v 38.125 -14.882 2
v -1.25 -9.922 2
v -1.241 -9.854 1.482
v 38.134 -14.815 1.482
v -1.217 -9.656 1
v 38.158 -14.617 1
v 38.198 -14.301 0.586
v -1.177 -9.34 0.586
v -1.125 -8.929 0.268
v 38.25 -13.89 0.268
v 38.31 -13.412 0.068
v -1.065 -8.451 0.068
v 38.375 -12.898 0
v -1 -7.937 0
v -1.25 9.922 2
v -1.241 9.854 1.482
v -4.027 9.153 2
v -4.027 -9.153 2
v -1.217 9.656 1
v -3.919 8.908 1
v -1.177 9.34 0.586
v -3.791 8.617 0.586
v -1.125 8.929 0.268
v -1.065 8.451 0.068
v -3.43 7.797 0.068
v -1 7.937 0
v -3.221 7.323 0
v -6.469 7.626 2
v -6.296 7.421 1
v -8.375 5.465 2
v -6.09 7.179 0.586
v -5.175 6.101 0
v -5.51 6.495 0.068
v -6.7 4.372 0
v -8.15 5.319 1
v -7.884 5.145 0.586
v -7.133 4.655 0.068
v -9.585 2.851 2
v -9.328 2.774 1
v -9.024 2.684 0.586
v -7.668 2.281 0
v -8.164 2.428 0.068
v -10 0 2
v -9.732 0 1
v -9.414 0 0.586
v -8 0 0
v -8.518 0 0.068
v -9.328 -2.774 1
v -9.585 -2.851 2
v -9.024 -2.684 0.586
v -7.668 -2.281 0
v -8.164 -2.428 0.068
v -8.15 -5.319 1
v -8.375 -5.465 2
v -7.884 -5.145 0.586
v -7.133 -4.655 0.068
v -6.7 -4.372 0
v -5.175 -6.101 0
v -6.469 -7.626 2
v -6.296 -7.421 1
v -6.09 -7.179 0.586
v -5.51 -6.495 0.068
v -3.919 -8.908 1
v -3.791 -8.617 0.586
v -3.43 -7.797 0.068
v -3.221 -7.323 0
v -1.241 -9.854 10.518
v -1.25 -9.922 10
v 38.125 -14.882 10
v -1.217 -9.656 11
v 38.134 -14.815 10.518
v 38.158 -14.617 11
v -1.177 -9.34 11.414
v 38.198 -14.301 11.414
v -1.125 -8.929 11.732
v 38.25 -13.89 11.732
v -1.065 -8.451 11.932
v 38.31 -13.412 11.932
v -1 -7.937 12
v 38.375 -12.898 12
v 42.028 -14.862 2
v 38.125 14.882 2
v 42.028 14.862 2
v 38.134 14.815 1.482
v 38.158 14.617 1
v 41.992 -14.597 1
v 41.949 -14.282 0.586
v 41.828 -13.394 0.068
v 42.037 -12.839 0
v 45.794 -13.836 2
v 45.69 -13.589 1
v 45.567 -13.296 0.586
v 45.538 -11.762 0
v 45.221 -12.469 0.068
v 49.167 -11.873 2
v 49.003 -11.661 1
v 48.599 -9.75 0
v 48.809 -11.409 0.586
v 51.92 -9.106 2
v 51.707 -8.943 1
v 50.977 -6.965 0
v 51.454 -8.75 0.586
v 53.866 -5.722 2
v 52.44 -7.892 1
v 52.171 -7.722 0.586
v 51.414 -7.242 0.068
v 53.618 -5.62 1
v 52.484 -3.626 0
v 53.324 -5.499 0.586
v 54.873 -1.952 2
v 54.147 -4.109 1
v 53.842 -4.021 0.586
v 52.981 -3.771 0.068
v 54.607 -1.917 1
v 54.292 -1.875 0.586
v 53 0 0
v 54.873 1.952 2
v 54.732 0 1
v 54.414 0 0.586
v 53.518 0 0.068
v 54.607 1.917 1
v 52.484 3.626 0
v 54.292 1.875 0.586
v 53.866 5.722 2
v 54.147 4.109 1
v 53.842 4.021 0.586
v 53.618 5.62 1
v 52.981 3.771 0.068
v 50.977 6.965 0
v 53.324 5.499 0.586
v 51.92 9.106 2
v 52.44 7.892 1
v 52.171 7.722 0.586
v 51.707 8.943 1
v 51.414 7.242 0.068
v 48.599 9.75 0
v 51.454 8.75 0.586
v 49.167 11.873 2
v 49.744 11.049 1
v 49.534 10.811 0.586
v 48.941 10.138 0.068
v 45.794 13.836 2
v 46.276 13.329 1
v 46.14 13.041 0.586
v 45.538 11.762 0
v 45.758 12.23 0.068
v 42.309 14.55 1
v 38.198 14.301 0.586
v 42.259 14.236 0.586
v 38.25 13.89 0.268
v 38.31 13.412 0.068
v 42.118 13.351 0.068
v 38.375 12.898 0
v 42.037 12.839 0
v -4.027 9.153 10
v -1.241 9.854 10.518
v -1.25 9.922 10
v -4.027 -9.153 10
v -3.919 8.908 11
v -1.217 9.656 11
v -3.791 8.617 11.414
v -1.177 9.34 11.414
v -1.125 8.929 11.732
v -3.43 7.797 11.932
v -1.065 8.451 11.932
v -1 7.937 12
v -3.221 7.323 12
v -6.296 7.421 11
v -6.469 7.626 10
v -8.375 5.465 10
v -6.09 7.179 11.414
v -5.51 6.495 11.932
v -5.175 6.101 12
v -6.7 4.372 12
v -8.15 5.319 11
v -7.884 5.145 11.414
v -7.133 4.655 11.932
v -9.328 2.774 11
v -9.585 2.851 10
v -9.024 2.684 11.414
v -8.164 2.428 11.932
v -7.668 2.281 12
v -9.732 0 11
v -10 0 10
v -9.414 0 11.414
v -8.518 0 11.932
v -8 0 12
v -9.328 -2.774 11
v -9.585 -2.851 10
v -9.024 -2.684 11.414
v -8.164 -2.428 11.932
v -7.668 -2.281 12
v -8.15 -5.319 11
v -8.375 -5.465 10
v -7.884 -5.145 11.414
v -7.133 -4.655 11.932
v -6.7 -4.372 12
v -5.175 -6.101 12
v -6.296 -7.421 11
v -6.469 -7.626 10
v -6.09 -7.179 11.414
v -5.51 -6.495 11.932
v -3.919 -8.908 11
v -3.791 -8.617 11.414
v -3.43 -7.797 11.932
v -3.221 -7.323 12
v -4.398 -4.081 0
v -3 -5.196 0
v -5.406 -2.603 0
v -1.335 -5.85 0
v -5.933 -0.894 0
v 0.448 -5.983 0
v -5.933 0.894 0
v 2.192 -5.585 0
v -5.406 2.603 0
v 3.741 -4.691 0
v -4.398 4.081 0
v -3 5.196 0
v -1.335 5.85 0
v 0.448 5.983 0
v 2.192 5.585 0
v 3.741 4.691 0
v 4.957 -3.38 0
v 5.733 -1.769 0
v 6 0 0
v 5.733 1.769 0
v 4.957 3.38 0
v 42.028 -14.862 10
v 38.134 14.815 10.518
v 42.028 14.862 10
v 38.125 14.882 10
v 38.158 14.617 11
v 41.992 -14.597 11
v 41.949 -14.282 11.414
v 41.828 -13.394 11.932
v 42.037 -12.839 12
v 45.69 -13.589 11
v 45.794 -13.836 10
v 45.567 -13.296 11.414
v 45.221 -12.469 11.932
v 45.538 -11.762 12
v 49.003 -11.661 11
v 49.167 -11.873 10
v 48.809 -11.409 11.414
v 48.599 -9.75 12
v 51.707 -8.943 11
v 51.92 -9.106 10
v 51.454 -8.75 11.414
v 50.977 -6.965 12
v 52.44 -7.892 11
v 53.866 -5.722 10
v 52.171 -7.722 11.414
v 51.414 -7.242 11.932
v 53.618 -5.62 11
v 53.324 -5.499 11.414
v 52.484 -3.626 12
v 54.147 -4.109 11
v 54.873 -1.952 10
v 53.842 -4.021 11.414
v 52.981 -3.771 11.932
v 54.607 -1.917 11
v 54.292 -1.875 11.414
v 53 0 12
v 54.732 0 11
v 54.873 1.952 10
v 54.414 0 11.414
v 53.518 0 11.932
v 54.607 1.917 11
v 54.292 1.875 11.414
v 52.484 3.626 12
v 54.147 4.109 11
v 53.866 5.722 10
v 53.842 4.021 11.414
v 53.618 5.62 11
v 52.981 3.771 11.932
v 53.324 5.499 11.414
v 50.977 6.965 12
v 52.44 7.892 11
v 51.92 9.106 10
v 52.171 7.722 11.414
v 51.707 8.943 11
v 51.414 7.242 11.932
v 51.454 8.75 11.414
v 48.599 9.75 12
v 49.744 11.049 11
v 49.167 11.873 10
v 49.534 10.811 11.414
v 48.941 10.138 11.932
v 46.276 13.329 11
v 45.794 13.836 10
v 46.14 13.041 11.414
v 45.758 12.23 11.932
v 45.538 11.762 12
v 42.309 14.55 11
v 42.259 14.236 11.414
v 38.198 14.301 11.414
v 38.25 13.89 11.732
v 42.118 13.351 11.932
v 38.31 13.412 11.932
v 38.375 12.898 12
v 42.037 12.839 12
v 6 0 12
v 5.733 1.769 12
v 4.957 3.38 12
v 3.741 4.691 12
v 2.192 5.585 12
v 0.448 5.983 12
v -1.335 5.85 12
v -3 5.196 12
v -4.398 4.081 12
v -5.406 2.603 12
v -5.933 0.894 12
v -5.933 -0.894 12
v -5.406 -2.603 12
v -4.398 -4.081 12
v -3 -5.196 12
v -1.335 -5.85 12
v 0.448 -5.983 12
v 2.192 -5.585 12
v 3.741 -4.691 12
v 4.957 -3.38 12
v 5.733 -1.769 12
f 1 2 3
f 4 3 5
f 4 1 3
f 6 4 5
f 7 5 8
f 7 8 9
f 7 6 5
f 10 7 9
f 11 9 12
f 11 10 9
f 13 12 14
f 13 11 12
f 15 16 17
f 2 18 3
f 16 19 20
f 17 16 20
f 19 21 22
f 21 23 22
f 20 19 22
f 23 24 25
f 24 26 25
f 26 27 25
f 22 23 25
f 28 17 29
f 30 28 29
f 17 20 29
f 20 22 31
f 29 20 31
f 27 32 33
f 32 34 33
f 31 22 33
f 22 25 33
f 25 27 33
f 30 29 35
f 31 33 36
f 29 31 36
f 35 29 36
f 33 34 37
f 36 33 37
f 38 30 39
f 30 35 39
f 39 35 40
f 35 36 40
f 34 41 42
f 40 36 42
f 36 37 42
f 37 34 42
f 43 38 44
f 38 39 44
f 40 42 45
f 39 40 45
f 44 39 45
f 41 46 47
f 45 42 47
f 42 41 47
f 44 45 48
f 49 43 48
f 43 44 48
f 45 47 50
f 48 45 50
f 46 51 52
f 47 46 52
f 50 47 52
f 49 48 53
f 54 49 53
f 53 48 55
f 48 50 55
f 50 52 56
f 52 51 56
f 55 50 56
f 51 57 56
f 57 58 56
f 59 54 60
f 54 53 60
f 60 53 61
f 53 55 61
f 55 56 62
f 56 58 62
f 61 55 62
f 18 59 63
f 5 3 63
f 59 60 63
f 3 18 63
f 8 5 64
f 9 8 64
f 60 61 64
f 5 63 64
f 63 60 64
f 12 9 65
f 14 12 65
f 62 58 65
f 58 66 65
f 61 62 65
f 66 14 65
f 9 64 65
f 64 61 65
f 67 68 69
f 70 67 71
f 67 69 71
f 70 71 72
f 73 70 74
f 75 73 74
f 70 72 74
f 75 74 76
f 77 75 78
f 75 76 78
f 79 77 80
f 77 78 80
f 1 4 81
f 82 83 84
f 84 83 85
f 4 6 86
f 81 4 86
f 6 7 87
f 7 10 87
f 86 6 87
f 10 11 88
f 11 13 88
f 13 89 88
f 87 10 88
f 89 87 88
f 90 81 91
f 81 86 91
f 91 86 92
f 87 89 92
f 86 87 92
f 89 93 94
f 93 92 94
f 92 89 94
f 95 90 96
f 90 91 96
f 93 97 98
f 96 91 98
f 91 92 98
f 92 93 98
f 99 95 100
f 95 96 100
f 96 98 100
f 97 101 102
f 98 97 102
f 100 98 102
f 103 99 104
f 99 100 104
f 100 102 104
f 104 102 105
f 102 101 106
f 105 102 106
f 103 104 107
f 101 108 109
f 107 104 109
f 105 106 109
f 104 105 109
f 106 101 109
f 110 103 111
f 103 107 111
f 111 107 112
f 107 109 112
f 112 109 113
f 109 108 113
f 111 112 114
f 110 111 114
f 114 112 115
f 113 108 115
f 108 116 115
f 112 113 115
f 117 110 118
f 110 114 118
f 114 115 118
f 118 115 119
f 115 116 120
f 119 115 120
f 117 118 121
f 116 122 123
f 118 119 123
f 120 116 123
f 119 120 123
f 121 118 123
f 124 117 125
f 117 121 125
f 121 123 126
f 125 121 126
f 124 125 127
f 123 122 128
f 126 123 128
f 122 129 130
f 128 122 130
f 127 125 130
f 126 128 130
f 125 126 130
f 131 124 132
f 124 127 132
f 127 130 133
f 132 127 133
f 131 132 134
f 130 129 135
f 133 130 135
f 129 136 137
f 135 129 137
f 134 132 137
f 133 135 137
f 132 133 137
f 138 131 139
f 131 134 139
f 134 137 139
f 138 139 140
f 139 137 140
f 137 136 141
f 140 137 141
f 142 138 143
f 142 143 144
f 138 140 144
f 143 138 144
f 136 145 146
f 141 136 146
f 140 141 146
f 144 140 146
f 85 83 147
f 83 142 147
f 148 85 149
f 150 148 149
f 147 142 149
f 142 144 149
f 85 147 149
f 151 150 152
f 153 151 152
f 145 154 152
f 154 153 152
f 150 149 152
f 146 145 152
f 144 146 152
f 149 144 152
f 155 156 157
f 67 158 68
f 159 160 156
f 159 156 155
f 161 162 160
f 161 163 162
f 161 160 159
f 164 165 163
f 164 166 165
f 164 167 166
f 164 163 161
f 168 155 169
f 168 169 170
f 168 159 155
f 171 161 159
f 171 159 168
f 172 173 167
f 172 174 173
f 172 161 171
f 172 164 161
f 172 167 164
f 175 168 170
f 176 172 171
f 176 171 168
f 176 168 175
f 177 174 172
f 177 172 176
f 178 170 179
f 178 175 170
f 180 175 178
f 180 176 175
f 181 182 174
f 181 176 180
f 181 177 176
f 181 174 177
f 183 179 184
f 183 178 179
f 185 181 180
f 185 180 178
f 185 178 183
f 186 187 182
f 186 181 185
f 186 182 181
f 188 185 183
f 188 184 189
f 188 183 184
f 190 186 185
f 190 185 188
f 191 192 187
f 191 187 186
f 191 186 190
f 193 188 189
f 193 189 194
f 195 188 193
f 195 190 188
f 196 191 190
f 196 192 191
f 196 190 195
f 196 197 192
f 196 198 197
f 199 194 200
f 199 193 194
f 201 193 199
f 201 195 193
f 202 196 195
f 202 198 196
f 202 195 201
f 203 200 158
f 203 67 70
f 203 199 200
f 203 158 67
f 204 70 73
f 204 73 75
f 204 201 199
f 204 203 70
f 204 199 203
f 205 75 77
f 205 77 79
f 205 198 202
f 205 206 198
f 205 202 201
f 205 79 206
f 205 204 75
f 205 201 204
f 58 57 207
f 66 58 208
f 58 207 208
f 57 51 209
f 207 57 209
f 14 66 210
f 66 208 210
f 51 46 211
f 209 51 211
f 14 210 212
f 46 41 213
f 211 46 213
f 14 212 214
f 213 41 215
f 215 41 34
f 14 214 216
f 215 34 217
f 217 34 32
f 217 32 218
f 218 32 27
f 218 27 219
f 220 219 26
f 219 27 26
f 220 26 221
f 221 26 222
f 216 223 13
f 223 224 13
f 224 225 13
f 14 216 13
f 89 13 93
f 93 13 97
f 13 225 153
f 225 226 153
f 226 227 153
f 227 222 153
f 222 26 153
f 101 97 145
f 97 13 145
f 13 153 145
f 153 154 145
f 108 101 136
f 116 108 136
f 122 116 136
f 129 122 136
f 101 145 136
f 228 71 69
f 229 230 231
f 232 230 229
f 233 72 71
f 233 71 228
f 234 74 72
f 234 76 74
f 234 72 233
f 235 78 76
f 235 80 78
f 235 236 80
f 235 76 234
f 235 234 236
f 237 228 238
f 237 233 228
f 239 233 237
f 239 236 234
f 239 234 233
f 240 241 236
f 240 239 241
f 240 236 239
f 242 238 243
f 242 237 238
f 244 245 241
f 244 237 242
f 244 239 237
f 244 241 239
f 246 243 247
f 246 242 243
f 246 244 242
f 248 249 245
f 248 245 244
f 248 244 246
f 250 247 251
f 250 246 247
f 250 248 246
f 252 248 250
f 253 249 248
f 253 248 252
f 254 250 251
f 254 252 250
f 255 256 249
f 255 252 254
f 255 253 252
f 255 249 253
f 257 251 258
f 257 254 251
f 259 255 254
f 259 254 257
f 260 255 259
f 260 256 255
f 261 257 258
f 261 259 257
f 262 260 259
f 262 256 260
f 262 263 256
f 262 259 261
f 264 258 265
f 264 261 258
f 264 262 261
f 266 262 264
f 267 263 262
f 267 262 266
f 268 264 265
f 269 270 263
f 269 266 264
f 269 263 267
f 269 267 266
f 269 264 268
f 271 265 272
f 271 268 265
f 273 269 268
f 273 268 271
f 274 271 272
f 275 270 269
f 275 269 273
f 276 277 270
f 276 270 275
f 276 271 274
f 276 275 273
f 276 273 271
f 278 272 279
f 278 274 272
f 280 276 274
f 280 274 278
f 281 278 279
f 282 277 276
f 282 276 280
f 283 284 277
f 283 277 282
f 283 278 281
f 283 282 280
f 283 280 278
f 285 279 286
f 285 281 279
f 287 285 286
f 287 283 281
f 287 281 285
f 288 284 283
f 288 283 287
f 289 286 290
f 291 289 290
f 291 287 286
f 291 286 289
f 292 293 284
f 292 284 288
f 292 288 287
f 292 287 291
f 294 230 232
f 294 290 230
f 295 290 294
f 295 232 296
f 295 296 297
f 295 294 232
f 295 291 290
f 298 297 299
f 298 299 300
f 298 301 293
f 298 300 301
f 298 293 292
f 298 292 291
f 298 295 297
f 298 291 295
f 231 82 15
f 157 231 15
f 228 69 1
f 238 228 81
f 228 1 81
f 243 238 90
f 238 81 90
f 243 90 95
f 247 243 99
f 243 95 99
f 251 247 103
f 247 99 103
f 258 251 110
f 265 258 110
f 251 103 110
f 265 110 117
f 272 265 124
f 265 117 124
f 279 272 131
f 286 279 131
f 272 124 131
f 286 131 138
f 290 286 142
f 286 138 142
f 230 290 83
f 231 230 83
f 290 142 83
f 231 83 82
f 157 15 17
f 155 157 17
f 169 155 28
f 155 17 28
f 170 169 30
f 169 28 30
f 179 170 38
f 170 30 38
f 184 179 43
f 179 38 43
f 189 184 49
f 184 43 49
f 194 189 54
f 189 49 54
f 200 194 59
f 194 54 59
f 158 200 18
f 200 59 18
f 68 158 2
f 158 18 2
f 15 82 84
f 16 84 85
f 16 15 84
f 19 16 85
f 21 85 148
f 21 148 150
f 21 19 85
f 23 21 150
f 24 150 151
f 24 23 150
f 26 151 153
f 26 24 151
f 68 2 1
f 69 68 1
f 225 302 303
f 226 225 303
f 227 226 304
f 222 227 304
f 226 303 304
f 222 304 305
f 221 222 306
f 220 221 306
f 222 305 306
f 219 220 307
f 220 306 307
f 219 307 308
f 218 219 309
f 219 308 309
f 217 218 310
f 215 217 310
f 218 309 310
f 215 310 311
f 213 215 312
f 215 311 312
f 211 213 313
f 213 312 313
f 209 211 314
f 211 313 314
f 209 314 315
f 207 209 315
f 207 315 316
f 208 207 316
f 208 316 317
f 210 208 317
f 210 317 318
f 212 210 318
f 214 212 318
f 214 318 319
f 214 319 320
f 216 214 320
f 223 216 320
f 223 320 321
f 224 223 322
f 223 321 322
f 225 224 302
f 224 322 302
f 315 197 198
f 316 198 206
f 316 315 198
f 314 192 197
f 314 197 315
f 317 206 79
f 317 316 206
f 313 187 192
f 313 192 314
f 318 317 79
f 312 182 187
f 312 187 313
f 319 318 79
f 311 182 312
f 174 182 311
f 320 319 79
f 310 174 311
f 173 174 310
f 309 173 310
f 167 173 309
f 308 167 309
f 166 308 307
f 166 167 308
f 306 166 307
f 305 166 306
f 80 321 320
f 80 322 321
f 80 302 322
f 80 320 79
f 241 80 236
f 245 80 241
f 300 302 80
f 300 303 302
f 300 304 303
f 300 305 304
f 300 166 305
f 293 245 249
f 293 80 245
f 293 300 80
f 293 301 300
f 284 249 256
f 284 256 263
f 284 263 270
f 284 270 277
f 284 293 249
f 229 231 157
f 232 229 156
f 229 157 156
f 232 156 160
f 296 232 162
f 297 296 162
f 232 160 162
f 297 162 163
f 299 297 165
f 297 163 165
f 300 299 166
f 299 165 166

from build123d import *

# Parameters (mm, degrees)
F1_DEPTH = 12
F2_R     = 6
F3_DEPTH = 12
F4_R     = 2


with BuildPart() as f1:
    # F0 (on Top) → F1 (new body)
    with BuildSketch(Plane.XY):
        with BuildLine():
            Line((38.125, 14.882351), (-1.25, 9.921567))
            ThreePointArc((-1.25, 9.921567), (-10, 0), (-1.25, -9.921567))
            Line((-1.25, -9.921567), (38.125, -14.882351))
            ThreePointArc((38.125, -14.882351), (55, 0), (38.125, 14.882351))
        make_face()
    extrude(amount=F1_DEPTH)

    # F2 (on face) → F3 (cut, through all)
    with BuildSketch(Plane.XY.offset(12)):
        Circle(F2_R)
    extrude(amount=-F3_DEPTH, mode=Mode.SUBTRACT)

    # F4
    f4_edges = [f1.edges().sort_by_distance(p)[0] for p in [
        (18.4375, 12.401959, 12),
        (18.4375, 12.401959, 0),
    ]]
    fillet(f4_edges, radius=F4_R)


solid = f1.part
